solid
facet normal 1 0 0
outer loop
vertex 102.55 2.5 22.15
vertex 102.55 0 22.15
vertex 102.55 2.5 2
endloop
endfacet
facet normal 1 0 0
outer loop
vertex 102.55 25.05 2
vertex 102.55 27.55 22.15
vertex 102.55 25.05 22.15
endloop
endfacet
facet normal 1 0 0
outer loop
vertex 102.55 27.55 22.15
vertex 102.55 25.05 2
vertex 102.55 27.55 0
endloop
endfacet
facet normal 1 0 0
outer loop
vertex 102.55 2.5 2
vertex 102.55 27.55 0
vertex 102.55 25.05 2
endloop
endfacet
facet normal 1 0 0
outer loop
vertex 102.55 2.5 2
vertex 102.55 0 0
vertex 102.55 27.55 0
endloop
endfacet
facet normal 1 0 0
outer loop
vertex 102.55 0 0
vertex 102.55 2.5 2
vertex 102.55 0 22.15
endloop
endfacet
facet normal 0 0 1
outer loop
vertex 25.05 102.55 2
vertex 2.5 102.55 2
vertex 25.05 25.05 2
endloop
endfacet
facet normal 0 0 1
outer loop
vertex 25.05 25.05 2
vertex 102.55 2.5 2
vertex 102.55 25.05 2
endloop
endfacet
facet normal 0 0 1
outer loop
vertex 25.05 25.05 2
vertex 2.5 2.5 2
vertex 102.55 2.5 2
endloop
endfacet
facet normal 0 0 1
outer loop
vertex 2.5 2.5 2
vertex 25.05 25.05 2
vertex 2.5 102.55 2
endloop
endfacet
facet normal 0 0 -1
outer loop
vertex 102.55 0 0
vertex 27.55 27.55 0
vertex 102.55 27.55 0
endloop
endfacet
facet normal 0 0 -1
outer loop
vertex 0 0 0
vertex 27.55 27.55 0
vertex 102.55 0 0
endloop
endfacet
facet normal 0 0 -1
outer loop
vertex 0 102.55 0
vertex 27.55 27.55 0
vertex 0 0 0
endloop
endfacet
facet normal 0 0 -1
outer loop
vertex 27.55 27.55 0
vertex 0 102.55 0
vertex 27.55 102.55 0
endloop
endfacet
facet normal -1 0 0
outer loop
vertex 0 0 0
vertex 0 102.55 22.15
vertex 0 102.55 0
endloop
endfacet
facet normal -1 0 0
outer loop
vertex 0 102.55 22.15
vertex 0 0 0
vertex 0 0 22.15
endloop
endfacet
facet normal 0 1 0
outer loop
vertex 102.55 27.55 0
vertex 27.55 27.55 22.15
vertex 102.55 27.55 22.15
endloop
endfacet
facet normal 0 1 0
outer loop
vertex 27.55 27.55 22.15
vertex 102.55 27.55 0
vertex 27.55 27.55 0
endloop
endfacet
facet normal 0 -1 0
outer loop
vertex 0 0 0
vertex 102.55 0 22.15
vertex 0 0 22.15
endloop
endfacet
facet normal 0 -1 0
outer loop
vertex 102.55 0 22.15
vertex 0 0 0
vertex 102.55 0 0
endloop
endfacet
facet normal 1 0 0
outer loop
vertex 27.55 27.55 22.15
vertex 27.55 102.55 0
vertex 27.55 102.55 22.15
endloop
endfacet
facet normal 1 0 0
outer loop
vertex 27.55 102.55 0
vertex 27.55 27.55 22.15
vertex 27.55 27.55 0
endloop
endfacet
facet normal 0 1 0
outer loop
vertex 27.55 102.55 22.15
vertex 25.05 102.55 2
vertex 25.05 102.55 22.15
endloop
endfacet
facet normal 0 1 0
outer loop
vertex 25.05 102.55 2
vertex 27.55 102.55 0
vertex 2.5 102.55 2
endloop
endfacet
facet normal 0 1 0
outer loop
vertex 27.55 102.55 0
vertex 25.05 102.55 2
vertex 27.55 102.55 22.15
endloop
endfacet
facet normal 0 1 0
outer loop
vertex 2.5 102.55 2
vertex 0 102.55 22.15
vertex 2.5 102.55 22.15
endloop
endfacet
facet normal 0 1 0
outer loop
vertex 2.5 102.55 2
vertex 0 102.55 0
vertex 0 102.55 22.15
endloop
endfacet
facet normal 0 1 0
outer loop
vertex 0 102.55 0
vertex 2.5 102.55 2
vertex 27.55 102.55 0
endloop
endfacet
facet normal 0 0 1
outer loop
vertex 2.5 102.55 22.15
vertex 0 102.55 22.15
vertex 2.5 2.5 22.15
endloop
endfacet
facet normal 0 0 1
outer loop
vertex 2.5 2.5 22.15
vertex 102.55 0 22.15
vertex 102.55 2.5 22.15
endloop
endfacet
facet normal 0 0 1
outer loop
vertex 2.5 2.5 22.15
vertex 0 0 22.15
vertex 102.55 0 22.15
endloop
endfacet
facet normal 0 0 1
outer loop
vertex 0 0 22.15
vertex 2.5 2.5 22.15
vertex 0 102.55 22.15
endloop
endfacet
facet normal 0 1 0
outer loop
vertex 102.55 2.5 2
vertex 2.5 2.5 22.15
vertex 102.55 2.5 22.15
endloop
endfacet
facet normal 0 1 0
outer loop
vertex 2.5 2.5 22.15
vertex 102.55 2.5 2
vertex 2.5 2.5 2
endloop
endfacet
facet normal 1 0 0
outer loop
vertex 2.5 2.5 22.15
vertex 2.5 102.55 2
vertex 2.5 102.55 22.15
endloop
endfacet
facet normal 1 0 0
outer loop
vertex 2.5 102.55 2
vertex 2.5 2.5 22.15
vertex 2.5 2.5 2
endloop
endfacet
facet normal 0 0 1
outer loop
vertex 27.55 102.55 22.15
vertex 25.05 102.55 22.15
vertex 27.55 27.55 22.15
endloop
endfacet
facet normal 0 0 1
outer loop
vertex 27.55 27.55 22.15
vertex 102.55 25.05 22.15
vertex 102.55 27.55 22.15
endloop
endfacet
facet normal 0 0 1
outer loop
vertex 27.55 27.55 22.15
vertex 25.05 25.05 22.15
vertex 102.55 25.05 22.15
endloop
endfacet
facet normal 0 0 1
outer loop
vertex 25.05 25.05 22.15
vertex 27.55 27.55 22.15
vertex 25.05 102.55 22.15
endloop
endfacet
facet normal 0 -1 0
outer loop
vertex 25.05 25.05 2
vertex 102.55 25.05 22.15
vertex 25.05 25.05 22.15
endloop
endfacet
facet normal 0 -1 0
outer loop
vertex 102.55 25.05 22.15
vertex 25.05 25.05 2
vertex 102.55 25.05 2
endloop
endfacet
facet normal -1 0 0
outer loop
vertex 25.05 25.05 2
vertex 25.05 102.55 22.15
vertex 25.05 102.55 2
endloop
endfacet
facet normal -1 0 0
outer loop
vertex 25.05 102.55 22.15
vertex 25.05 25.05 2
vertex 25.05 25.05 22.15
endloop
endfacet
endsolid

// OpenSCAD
// ============================================================
// Greenhouse 90° Corner Rail Brace
// Snaps onto aluminium glazing bar junction from above.
// Material: PETG recommended (UV + weather resistant).
// Print orientation: base plate face-down, no supports needed.
// ============================================================

// ---- PARAMETERS (measure your bars and adjust) -------------
bar_width     = 22.15;  // mm — glazing bar width
bar_height    = 20.15;  // mm — glazing bar profile height (wall grip depth)
arm_length    = 75;     // mm — how far each arm extends along bar
base_thick    = 2;      // mm — base plate thickness
wall_thick    = 2.5;    // mm — wall thickness
clearance     = 0.2;    // mm — press fit tolerance (increase to 0.3 for looser)

// ---- DERIVED (do not edit) ---------------------------------
chan_w  = bar_width + clearance * 2;
outer_w = chan_w + wall_thick * 2;

// ============================================================
module l_brace() {
    // L-shaped base plate
    union() {
        cube([arm_length + outer_w, outer_w, base_thick]);
        cube([outer_w, arm_length + outer_w, base_thick]);
    }

    // Outer walls — full L perimeter
    translate([0, 0, base_thick]) {
        cube([arm_length + outer_w, wall_thick, bar_height]);  // arm 1 outer
        cube([wall_thick, arm_length + outer_w, bar_height]);  // arm 2 outer
    }

    // Inner walls — arms only, open junction
    translate([outer_w, outer_w - wall_thick, base_thick])
        cube([arm_length, wall_thick, bar_height]);  // arm 1 inner

    translate([outer_w - wall_thick, outer_w, base_thick])
        cube([wall_thick, arm_length, bar_height]);  // arm 2 inner

    // Corner pillar — bridges gap between inner walls
    translate([outer_w - wall_thick, outer_w - wall_thick, base_thick])
        cube([wall_thick, wall_thick, bar_height]);
}

l_brace();
